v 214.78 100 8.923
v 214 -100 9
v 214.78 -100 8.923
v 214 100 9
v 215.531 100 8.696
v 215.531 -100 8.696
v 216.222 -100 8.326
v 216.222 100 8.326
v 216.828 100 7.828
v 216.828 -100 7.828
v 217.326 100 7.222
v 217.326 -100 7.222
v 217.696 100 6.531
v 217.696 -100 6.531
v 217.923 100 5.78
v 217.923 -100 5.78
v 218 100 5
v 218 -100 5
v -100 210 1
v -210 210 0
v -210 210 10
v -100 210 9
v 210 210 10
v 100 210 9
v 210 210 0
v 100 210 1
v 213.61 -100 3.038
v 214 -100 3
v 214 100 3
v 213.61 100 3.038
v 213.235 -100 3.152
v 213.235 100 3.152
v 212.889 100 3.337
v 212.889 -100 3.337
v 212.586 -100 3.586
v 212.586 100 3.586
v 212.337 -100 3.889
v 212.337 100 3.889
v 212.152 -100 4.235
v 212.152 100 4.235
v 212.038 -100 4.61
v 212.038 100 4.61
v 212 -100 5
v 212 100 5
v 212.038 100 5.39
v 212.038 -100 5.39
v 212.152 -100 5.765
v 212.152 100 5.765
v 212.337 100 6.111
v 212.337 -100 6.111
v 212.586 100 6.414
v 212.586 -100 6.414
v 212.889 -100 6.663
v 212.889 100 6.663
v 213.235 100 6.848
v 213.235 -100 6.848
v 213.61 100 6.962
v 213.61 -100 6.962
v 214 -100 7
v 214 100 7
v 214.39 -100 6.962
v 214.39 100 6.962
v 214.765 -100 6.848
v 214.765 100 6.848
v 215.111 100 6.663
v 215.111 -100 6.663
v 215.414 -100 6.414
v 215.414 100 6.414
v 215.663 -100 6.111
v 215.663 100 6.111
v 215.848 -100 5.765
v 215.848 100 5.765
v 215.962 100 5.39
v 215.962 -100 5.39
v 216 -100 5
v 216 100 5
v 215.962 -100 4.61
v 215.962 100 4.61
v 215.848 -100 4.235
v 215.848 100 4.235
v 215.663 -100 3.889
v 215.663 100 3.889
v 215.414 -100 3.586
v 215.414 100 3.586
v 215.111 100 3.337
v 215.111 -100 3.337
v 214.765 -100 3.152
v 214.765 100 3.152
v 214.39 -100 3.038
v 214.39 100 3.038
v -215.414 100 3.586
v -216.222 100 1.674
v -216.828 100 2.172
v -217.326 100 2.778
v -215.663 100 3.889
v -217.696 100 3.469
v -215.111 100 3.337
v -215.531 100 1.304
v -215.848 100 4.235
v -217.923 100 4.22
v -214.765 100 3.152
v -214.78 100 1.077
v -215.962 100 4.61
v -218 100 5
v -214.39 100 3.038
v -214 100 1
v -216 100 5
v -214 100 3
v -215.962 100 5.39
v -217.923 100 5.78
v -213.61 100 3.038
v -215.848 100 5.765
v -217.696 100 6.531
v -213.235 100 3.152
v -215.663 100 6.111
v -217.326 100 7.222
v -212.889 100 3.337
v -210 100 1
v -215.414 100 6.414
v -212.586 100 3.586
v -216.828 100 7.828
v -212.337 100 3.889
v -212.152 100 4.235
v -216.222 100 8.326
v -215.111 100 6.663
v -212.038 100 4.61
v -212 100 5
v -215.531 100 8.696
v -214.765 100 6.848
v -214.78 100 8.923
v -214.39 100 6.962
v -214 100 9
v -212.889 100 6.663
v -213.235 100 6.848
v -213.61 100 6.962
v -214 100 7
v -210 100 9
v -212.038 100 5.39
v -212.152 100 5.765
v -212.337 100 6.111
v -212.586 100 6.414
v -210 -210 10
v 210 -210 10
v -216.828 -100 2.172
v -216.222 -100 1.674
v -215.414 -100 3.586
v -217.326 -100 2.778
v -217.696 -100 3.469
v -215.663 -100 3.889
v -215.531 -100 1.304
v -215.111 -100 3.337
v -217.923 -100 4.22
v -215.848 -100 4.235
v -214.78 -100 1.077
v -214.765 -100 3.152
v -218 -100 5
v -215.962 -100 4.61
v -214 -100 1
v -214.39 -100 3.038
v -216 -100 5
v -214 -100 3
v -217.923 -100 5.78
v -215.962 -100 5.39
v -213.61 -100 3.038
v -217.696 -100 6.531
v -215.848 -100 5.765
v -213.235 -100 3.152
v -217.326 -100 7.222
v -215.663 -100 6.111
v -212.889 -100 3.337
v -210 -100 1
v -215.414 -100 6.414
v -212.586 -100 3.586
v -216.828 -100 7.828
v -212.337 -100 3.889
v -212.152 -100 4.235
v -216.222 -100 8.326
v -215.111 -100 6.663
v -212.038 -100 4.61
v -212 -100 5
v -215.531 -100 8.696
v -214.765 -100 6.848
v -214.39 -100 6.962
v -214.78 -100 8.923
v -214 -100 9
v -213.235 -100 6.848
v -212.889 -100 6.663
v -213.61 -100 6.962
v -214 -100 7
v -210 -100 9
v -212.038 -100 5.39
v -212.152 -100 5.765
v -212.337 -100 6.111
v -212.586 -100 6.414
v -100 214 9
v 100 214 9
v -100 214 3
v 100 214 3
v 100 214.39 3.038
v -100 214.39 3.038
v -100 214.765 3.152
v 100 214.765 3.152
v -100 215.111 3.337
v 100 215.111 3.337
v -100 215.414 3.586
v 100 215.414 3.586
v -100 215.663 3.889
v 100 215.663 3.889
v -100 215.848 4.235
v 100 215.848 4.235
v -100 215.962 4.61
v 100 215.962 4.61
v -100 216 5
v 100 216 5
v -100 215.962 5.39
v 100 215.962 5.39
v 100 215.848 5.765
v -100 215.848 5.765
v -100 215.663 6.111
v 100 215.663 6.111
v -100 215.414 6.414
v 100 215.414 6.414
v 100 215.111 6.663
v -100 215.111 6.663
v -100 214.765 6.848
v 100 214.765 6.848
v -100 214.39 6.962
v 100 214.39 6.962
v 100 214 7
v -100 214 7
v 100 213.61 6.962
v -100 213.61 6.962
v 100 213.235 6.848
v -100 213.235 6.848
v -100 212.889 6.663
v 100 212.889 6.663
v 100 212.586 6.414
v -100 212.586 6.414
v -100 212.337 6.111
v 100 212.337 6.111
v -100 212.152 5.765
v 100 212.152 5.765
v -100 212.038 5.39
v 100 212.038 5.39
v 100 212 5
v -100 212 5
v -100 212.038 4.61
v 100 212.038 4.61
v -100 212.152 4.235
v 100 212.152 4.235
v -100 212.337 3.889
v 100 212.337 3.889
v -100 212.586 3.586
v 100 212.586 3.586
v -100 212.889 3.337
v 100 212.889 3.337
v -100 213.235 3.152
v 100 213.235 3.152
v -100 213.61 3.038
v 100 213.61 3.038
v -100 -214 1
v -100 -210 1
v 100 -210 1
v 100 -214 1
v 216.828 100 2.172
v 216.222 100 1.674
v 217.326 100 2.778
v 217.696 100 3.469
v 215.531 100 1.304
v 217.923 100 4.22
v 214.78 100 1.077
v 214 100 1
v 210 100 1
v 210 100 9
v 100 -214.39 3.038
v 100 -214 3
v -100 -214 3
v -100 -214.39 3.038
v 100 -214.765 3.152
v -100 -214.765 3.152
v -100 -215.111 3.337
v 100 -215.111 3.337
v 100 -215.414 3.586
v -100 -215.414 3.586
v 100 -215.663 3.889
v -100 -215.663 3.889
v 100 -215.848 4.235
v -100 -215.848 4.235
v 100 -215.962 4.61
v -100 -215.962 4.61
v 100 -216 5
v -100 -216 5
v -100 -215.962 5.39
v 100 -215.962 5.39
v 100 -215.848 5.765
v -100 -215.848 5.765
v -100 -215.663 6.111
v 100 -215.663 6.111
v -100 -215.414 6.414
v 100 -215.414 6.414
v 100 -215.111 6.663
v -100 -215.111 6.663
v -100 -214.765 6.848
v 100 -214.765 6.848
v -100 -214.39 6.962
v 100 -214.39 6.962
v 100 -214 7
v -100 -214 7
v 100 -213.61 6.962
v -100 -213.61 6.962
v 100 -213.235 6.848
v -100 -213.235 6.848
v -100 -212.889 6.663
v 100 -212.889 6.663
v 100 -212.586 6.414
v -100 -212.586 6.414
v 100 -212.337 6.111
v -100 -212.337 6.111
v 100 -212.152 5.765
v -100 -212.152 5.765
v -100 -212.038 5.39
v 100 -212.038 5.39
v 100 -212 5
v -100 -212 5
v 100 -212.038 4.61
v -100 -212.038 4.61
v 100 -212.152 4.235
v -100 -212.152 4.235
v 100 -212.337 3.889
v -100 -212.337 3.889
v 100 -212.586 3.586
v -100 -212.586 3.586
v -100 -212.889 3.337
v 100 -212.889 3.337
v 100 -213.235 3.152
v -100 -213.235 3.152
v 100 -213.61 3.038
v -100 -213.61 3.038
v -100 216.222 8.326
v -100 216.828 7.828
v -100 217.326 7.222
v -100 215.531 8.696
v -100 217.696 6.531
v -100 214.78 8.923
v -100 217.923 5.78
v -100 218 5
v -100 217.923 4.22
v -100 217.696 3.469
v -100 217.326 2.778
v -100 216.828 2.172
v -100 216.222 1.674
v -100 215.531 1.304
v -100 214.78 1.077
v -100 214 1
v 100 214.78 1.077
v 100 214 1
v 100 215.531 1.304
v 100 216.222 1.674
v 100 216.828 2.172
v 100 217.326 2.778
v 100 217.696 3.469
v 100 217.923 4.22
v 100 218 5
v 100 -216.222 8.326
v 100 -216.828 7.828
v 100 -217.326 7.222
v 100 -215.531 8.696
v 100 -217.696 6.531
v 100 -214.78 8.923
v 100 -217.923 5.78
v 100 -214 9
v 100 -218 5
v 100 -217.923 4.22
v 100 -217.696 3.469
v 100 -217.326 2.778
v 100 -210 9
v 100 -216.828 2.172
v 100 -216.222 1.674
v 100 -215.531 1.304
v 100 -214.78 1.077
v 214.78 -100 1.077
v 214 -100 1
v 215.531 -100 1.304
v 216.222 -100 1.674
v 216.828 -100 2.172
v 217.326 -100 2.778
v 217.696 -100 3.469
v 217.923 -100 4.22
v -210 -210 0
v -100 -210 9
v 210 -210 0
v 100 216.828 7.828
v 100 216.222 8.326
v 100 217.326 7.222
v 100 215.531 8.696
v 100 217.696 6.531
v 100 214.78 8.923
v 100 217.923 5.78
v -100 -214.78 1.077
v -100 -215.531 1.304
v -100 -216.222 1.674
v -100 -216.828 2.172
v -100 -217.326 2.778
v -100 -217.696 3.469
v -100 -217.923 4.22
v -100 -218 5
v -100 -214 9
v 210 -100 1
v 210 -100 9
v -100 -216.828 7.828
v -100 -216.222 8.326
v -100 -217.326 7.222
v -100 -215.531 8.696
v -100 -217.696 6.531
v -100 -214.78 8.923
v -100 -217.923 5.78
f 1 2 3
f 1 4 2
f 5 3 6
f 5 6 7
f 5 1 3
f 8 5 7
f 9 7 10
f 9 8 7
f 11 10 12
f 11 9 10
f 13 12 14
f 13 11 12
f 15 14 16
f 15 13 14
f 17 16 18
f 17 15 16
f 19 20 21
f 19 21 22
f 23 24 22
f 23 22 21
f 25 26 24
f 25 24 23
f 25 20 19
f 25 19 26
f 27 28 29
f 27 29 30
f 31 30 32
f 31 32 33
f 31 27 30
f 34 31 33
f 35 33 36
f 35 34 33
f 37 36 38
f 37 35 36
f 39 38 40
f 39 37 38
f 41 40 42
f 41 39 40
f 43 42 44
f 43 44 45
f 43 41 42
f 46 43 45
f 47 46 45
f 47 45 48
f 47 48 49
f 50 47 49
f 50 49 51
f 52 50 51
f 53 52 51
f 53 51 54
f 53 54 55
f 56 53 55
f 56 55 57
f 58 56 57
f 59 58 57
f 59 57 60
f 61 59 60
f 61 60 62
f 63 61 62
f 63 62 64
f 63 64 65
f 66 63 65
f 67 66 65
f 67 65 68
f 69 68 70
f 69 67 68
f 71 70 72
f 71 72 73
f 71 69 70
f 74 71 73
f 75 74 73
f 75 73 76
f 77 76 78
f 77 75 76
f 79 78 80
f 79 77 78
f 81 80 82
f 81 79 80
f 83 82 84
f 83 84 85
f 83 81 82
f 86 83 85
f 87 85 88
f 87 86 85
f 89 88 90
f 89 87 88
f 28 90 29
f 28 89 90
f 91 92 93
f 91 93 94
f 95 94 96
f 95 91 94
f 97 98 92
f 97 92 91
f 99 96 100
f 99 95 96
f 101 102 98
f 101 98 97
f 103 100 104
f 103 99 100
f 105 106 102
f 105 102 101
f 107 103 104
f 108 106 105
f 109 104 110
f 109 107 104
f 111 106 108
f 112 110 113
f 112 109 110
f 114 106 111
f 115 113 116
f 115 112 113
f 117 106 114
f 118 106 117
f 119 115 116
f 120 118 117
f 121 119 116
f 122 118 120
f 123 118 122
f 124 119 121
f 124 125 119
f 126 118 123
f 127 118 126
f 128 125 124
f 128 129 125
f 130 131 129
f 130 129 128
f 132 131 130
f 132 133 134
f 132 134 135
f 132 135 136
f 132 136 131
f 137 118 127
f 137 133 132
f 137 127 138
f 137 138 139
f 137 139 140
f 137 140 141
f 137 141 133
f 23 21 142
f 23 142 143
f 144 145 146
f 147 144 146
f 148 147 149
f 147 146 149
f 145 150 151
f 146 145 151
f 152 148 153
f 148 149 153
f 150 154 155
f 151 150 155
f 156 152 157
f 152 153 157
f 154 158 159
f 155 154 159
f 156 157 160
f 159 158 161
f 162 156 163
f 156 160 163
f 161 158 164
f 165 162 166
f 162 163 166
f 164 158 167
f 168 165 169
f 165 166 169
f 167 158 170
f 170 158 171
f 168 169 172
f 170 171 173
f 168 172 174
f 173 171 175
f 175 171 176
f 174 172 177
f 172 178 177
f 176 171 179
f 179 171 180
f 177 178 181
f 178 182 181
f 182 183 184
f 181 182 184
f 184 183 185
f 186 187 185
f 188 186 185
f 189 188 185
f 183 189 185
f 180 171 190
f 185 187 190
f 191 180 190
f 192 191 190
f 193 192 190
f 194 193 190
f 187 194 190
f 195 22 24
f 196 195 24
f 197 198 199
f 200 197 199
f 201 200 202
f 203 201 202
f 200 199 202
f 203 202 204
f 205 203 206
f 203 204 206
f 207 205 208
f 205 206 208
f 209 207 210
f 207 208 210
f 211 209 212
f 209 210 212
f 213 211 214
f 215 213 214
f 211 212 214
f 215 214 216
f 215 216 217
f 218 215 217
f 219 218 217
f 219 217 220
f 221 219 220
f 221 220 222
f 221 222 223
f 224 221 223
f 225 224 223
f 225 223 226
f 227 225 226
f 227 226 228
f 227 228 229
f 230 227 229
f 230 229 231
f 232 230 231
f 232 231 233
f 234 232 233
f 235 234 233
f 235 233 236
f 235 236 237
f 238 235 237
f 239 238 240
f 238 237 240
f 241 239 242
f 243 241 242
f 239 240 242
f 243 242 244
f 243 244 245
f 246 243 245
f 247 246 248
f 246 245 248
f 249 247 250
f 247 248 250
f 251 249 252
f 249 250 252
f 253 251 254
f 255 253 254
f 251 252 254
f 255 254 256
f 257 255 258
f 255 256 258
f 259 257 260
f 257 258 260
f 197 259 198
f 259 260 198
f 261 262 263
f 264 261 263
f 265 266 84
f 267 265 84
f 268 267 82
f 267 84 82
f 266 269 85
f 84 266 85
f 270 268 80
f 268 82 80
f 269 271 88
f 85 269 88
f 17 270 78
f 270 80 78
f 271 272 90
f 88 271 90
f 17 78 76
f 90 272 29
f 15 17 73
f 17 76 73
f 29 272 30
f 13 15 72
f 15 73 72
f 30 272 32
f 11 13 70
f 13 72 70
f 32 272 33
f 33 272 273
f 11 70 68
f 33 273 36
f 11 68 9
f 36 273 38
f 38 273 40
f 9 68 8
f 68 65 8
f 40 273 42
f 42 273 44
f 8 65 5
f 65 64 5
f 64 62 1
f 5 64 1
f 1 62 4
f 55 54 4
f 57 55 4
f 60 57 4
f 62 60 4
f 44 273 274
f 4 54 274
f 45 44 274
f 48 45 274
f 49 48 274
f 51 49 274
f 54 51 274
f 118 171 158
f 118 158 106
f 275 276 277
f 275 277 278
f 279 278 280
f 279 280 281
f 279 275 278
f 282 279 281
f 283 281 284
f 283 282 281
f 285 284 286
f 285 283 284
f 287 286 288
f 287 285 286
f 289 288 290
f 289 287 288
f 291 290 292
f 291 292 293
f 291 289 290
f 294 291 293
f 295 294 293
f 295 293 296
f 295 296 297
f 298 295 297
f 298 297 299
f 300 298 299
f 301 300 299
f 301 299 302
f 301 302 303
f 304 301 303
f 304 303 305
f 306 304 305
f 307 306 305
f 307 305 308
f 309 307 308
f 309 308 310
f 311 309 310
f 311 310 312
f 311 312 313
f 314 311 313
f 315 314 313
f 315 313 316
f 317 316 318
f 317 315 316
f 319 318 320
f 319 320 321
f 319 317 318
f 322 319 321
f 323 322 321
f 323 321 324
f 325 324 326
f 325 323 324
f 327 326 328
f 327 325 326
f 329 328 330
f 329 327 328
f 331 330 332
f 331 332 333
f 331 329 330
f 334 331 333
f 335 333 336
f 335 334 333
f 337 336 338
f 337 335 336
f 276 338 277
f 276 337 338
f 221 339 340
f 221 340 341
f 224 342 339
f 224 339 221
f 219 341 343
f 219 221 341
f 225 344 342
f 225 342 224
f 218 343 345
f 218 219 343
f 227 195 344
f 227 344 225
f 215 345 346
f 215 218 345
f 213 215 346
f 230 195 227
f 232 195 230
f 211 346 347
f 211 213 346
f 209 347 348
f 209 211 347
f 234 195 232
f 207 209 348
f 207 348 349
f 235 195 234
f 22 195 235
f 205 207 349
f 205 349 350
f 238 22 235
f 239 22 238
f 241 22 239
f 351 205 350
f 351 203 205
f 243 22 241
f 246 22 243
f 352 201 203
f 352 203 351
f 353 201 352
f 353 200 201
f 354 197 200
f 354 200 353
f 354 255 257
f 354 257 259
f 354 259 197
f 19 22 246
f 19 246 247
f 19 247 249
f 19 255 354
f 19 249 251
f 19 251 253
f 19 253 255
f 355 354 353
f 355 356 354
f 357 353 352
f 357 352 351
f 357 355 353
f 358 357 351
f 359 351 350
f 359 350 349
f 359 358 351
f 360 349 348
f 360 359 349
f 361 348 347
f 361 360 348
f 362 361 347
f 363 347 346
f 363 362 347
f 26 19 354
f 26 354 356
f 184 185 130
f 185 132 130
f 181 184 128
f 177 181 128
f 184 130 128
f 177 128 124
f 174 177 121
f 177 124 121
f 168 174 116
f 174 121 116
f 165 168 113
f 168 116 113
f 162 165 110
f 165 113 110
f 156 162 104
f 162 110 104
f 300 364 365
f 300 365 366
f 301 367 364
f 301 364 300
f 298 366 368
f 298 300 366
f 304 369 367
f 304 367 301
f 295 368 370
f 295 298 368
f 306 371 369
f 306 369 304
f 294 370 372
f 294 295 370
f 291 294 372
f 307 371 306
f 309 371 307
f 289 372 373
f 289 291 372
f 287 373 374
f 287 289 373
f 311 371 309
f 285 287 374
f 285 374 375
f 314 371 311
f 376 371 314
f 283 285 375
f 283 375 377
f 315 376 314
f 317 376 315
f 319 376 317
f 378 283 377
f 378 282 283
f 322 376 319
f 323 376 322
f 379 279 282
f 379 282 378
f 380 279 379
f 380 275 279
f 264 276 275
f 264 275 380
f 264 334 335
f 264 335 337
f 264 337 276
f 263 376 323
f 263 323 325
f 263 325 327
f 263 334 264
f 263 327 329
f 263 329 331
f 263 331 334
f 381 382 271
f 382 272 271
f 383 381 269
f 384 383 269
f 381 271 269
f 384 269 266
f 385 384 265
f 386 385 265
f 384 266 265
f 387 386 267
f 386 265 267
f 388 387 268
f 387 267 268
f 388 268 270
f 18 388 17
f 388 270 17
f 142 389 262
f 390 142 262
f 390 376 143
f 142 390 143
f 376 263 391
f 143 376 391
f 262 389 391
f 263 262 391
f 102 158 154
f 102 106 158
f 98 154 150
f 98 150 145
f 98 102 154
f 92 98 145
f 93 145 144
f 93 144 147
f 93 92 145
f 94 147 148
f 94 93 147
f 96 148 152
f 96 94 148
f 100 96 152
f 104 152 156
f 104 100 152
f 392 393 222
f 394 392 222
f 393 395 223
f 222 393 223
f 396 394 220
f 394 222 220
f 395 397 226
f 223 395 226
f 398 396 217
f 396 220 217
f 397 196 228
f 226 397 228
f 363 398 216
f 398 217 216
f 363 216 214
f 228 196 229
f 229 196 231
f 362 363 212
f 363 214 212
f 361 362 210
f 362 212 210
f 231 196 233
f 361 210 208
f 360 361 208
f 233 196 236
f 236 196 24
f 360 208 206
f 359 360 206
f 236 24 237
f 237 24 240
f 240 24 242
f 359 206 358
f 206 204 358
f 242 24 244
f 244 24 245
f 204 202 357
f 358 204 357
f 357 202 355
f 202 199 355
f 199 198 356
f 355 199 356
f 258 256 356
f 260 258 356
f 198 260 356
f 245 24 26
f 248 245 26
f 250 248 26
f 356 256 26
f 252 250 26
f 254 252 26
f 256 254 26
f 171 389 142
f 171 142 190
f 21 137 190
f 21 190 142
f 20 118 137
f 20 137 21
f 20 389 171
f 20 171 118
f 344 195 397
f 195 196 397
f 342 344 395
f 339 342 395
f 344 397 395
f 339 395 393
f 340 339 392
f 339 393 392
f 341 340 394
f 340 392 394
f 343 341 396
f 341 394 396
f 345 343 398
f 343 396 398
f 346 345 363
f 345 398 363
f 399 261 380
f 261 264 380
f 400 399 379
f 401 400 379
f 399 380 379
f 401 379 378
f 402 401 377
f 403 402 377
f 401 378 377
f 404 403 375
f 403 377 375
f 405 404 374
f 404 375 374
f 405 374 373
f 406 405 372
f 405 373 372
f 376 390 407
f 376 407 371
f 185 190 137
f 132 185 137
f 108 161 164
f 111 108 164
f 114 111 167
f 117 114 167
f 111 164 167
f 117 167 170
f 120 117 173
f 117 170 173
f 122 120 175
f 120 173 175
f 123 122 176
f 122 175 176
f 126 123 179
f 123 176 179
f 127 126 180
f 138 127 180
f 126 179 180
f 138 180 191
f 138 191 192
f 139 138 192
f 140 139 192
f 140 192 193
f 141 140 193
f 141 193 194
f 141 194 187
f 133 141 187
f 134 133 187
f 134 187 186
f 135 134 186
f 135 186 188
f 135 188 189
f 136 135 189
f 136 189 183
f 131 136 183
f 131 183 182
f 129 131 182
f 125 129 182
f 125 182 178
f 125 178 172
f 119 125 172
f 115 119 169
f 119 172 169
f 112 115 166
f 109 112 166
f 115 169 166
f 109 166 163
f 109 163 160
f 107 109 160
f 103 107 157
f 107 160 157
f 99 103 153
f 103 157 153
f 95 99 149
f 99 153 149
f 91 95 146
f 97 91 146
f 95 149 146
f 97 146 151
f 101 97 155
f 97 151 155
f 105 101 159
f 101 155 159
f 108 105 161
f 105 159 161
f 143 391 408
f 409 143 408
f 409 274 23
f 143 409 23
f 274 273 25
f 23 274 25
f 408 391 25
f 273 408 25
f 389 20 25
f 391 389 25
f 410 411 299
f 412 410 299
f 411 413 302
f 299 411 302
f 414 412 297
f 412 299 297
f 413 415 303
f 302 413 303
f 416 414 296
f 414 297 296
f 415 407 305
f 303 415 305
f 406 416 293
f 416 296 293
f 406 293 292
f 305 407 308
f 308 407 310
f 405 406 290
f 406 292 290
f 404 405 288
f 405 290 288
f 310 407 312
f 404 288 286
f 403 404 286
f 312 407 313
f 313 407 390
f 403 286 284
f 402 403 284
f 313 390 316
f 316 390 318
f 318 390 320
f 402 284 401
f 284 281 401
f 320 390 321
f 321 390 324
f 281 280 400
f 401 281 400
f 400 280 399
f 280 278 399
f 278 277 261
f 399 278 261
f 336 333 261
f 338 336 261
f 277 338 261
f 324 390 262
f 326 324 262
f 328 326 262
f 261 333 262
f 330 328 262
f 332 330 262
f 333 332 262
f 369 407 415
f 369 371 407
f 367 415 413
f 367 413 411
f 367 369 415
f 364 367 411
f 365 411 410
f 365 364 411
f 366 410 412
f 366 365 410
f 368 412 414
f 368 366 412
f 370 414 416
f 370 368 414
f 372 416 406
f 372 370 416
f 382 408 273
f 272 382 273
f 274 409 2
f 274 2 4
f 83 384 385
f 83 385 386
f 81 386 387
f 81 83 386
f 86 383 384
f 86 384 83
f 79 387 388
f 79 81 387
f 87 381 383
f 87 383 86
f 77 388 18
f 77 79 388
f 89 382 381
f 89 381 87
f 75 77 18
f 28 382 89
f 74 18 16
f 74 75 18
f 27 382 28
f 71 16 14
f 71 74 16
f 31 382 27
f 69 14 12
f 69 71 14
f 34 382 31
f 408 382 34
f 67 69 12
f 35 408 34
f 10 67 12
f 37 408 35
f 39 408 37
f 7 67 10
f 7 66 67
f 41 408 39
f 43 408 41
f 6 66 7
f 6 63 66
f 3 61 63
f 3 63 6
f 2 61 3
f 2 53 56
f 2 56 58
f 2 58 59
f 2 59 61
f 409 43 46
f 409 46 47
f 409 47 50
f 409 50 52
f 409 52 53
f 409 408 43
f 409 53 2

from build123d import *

# Parameters (mm, degrees)
SKETCH_1_W             = 420
SKETCH_1_H             = 420
EXTRUDE_1_DEPTH        = 10
SKETCH_2_W             = 200
SKETCH_2_H             = 8
EXTRUDE_2_DEPTH        = 8
CUT_EXTRUDE_1_REACH    = 381.109
SKETCH_3_R             = 2
FILLET_1_R             = 4
FILLET_1_OF_MIRROR_1_R = 4
SKETCH_4_W             = 8
SKETCH_4_H             = 200
EXTRUDE_3_DEPTH        = 8
FILLET_2_R             = 4
CUT_EXTRUDE_2_REACH    = 387.679
SKETCH_5_R             = 2
FILLET_2_OF_MIRROR_3_R = 4


with BuildPart() as part:
    # 草图1 → 凸台-拉伸1 (new body)
    with BuildSketch(Plane.XY):
        Rectangle(SKETCH_1_W, SKETCH_1_H)
    extrude_1 = extrude(amount=EXTRUDE_1_DEPTH)

    # 草图2 → 凸台-拉伸2 (add)
    with BuildSketch(Plane(origin=(0, 210, 0), x_dir=(1, 0, 0), z_dir=(0, 1, 0))):
        with Locations((0, -5)):
            Rectangle(SKETCH_2_W, SKETCH_2_H)
    extrude_2 = extrude(amount=EXTRUDE_2_DEPTH)

    # 草图3 → 切除-拉伸1 (cut, up to next)
    with BuildSketch(Plane(origin=(100, 0, 0), x_dir=(0, 0, -1), z_dir=(1, 0, 0)), mode=Mode.PRIVATE) as cut_extrude_1_sk1:
        with Locations((-5, 214)):
            Circle(SKETCH_3_R)
    cut_extrude_1_tool1 = extrude(cut_extrude_1_sk1.sketch, amount=-CUT_EXTRUDE_1_REACH, mode=Mode.PRIVATE) & part.part
    cut_extrude_1 = cut_extrude_1_tool1.solids().sort_by_distance((100, 214, 5))[0]
    add(cut_extrude_1, mode=Mode.SUBTRACT)

    # 圆角1
    fillet_1_edges = [part.edges().sort_by_distance(p)[0] for p in [
        (0, 218, 1),
        (0, 218, 9),
    ]]
    fillet(fillet_1_edges, radius=FILLET_1_R - 0.0001)  # a hair under: the kernel refuses the full size

    # 镜向1: 凸台-拉伸1, 凸台-拉伸2, 切除-拉伸1 across plane
    add(extrude_1.mirror(Plane.ZX))
    add(extrude_2.mirror(Plane.ZX))
    add(cut_extrude_1.mirror(Plane.ZX), mode=Mode.SUBTRACT)

    # 圆角1 of 镜向1
    fillet_1_of_mirror_1_edges = [part.edges().sort_by_distance(p)[0] for p in [
        (0, -218, 1),
        (0, -218, 9),
    ]]
    fillet(fillet_1_of_mirror_1_edges, radius=FILLET_1_OF_MIRROR_1_R - 0.0001)  # a hair under: the kernel refuses the full size

    # 草图4 → 凸台-拉伸3 (add)
    with BuildSketch(Plane.ZY.offset(210)):
        with Locations((5, 0)):
            Rectangle(SKETCH_4_W, SKETCH_4_H)
    extrude_3 = extrude(amount=EXTRUDE_3_DEPTH)

    # 圆角2
    fillet_2_edges = [part.edges().sort_by_distance(p)[0] for p in [
        (-218, 0, 9),
        (-218, 0, 1),
    ]]
    fillet(fillet_2_edges, radius=FILLET_2_R - 0.0001)  # a hair under: the kernel refuses the full size

    # 草图5 → 切除-拉伸2 (cut, up to next)
    with BuildSketch(Plane.XZ.offset(100), mode=Mode.PRIVATE) as cut_extrude_2_sk1:
        with Locations(Location((-214, 5, 0), (0, 0, 270))):
            Circle(SKETCH_5_R)
    cut_extrude_2_tool1 = extrude(cut_extrude_2_sk1.sketch, amount=-CUT_EXTRUDE_2_REACH, mode=Mode.PRIVATE) & part.part
    cut_extrude_2 = cut_extrude_2_tool1.solids().sort_by_distance((-214, -100, 5))[0]
    add(cut_extrude_2, mode=Mode.SUBTRACT)

    # 镜向3: 凸台-拉伸3, 切除-拉伸2 across plane
    add(extrude_3.mirror(Plane(origin=(0, 0, 0), x_dir=(0, 0, 1), z_dir=(1, 0, 0))))
    add(cut_extrude_2.mirror(Plane(origin=(0, 0, 0), x_dir=(0, 0, 1), z_dir=(1, 0, 0))), mode=Mode.SUBTRACT)

    # 圆角2 of 镜向3
    fillet_2_of_mirror_3_edges = [part.edges().sort_by_distance(p)[0] for p in [
        (218, 0, 9),
        (218, 0, 1),
    ]]
    fillet(fillet_2_of_mirror_3_edges, radius=FILLET_2_OF_MIRROR_3_R - 0.0001)  # a hair under: the kernel refuses the full size


solid = part.part
